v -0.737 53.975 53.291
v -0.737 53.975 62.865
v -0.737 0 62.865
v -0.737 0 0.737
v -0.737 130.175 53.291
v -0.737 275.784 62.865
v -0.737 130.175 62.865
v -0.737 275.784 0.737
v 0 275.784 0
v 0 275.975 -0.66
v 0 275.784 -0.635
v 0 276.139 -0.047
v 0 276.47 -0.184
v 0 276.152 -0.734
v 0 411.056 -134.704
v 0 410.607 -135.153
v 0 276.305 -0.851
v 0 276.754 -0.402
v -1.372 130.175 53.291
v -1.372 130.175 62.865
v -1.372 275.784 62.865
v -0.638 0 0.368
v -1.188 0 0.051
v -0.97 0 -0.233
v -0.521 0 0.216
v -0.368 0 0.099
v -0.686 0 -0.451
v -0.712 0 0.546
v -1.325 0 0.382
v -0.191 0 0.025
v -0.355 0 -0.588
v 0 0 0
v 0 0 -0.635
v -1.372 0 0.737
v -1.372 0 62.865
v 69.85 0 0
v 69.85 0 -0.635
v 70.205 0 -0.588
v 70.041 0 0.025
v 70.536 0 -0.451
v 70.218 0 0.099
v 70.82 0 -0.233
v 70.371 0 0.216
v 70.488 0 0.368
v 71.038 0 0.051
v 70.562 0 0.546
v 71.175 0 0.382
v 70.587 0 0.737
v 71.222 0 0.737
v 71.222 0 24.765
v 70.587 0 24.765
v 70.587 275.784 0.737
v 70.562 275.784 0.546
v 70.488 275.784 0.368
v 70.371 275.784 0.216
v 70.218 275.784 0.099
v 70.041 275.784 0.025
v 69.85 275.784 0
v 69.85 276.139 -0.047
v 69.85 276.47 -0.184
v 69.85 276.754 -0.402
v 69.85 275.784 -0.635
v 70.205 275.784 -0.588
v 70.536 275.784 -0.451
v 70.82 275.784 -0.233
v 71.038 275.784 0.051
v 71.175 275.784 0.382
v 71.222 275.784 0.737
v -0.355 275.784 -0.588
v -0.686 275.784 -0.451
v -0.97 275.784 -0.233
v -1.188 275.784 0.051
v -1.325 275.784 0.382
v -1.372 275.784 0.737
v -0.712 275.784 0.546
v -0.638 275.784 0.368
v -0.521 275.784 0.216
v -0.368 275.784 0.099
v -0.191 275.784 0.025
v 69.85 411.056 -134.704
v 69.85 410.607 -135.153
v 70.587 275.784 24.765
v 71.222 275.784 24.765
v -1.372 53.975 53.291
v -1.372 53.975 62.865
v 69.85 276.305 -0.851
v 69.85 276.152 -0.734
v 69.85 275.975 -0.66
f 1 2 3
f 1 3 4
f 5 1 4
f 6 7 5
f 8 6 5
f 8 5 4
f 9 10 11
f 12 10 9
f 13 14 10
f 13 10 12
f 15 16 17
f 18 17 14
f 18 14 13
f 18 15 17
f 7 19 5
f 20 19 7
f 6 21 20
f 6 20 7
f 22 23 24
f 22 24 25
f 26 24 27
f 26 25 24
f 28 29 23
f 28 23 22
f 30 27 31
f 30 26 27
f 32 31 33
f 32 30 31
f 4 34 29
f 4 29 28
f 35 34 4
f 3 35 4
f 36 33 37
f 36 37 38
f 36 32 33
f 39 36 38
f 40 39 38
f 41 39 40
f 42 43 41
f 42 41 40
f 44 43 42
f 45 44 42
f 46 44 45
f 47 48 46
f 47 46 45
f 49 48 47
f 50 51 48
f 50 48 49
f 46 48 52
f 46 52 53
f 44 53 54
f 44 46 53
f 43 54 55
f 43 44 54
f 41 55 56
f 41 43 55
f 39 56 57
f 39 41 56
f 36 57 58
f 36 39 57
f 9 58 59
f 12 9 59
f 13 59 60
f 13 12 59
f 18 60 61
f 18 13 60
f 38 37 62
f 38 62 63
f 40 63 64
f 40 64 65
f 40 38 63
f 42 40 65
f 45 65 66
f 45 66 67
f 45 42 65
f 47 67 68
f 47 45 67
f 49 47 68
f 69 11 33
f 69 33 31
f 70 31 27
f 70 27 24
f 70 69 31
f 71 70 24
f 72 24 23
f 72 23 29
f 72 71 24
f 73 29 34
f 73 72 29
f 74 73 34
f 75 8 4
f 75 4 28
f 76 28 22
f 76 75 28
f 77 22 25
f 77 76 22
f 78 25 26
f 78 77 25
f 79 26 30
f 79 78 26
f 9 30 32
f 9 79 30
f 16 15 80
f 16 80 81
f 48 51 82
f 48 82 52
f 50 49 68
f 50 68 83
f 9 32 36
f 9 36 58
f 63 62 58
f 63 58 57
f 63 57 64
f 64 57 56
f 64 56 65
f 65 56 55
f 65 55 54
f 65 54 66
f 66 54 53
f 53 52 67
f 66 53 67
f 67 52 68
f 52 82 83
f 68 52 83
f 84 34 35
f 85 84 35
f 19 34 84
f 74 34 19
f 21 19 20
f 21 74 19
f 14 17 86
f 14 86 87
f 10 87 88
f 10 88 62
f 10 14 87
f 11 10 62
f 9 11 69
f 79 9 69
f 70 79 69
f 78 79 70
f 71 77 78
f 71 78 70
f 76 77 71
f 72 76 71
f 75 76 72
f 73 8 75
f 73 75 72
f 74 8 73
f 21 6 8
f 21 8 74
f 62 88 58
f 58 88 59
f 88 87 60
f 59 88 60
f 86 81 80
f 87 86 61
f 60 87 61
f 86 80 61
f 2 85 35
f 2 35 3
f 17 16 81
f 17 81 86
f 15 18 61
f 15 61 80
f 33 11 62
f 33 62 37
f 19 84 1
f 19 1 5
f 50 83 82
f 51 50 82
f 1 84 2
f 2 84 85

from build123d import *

# Parameters (mm, degrees)
BASE_FLANGE1_DEPTH = 69.85
EDGE_FLANGE1_DEPTH = 275.783864678
EDGE_FLANGE2_DEPTH = 275.783864678
CUT_EXTRUDE1_REACH = 440.752
SKETCH12_W         = 9.573642834
SKETCH12_H         = 76.2


# Sheet-metal steps are written as plain solids
with BuildPart() as part:
    # Sketch1 → Base-Flange1 (new body)
    with BuildSketch(Plane(origin=(0, 0, 0), x_dir=(0, 0, -1), z_dir=(1, 0, 0))):
        with BuildLine():
            Line((0, 0), (0, 275.783864678))
            ThreePointArc((0, 275.783864678), (0.104406833, 276.308753274), (0.401732339, 276.753732339))
            Line((0.401732339, 276.753732339), (134.703841816, 411.055841816))
            Line((134.703841816, 411.055841816), (135.152854622, 410.60682901))
            Line((135.152854622, 410.60682901), (0.850745145, 276.304719533))
            ThreePointArc((0.850745145, 276.304719533), (0.691070336, 276.065749294), (0.635, 275.783864678))
            Line((0.635, 275.783864678), (0.635, 0))
            Line((0.635, 0), (0, 0))
        make_face()
    extrude(amount=BASE_FLANGE1_DEPTH)

    # Edge-Flange1 section (across the edge) → Edge-Flange1 (add)
    with BuildSketch(Plane(origin=(-0.7366, 275.783864678, 0), x_dir=(1, 0, 0), z_dir=(0, -1, 0))):
        with BuildLine():
            Line((-0.635, 0.7366), (-0.635, 62.865))
            Line((-0.635, 62.865), (0, 62.865))
            Line((0, 62.865), (0, 0.7366))
            ThreePointArc((0, 0.7366), (0.215745145, 0.215745145), (0.7366, 0))
            Line((0.7366, 0), (0.7366, -0.635))
            ThreePointArc((0.7366, -0.635), (-0.233267661, -0.233267661), (-0.635, 0.7366))
        make_face()
    extrude(amount=EDGE_FLANGE1_DEPTH)

    # Edge-Flange2 section (across the edge) → Edge-Flange2 (add)
    with BuildSketch(Plane(origin=(70.5866, 0, 0), x_dir=(-1, 0, 0), z_dir=(0, 1, 0))):
        with BuildLine():
            Line((-0.635, 0.7366), (-0.635, 24.765))
            Line((-0.635, 24.765), (0, 24.765))
            Line((0, 24.765), (0, 0.7366))
            ThreePointArc((0, 0.7366), (0.215745145, 0.215745145), (0.7366, 0))
            Line((0.7366, 0), (0.7366, -0.635))
            ThreePointArc((0.7366, -0.635), (-0.233267661, -0.233267661), (-0.635, 0.7366))
        make_face()
    extrude(amount=EDGE_FLANGE2_DEPTH)

    # Sketch12 → Cut-Extrude1 (cut, up to next)
    with BuildSketch(Plane.ZY.offset(1.3716), mode=Mode.PRIVATE) as cut_extrude1_sk1:
        with Locations((58.078178583, 92.075)):
            Rectangle(SKETCH12_W, SKETCH12_H)
    cut_extrude1_tool1 = extrude(cut_extrude1_sk1.sketch, amount=-CUT_EXTRUDE1_REACH, mode=Mode.PRIVATE) & part.part
    add(cut_extrude1_tool1.solids().sort_by_distance((-1.3716, 92.075, 58.078179))[0], mode=Mode.SUBTRACT)


solid = part.part
